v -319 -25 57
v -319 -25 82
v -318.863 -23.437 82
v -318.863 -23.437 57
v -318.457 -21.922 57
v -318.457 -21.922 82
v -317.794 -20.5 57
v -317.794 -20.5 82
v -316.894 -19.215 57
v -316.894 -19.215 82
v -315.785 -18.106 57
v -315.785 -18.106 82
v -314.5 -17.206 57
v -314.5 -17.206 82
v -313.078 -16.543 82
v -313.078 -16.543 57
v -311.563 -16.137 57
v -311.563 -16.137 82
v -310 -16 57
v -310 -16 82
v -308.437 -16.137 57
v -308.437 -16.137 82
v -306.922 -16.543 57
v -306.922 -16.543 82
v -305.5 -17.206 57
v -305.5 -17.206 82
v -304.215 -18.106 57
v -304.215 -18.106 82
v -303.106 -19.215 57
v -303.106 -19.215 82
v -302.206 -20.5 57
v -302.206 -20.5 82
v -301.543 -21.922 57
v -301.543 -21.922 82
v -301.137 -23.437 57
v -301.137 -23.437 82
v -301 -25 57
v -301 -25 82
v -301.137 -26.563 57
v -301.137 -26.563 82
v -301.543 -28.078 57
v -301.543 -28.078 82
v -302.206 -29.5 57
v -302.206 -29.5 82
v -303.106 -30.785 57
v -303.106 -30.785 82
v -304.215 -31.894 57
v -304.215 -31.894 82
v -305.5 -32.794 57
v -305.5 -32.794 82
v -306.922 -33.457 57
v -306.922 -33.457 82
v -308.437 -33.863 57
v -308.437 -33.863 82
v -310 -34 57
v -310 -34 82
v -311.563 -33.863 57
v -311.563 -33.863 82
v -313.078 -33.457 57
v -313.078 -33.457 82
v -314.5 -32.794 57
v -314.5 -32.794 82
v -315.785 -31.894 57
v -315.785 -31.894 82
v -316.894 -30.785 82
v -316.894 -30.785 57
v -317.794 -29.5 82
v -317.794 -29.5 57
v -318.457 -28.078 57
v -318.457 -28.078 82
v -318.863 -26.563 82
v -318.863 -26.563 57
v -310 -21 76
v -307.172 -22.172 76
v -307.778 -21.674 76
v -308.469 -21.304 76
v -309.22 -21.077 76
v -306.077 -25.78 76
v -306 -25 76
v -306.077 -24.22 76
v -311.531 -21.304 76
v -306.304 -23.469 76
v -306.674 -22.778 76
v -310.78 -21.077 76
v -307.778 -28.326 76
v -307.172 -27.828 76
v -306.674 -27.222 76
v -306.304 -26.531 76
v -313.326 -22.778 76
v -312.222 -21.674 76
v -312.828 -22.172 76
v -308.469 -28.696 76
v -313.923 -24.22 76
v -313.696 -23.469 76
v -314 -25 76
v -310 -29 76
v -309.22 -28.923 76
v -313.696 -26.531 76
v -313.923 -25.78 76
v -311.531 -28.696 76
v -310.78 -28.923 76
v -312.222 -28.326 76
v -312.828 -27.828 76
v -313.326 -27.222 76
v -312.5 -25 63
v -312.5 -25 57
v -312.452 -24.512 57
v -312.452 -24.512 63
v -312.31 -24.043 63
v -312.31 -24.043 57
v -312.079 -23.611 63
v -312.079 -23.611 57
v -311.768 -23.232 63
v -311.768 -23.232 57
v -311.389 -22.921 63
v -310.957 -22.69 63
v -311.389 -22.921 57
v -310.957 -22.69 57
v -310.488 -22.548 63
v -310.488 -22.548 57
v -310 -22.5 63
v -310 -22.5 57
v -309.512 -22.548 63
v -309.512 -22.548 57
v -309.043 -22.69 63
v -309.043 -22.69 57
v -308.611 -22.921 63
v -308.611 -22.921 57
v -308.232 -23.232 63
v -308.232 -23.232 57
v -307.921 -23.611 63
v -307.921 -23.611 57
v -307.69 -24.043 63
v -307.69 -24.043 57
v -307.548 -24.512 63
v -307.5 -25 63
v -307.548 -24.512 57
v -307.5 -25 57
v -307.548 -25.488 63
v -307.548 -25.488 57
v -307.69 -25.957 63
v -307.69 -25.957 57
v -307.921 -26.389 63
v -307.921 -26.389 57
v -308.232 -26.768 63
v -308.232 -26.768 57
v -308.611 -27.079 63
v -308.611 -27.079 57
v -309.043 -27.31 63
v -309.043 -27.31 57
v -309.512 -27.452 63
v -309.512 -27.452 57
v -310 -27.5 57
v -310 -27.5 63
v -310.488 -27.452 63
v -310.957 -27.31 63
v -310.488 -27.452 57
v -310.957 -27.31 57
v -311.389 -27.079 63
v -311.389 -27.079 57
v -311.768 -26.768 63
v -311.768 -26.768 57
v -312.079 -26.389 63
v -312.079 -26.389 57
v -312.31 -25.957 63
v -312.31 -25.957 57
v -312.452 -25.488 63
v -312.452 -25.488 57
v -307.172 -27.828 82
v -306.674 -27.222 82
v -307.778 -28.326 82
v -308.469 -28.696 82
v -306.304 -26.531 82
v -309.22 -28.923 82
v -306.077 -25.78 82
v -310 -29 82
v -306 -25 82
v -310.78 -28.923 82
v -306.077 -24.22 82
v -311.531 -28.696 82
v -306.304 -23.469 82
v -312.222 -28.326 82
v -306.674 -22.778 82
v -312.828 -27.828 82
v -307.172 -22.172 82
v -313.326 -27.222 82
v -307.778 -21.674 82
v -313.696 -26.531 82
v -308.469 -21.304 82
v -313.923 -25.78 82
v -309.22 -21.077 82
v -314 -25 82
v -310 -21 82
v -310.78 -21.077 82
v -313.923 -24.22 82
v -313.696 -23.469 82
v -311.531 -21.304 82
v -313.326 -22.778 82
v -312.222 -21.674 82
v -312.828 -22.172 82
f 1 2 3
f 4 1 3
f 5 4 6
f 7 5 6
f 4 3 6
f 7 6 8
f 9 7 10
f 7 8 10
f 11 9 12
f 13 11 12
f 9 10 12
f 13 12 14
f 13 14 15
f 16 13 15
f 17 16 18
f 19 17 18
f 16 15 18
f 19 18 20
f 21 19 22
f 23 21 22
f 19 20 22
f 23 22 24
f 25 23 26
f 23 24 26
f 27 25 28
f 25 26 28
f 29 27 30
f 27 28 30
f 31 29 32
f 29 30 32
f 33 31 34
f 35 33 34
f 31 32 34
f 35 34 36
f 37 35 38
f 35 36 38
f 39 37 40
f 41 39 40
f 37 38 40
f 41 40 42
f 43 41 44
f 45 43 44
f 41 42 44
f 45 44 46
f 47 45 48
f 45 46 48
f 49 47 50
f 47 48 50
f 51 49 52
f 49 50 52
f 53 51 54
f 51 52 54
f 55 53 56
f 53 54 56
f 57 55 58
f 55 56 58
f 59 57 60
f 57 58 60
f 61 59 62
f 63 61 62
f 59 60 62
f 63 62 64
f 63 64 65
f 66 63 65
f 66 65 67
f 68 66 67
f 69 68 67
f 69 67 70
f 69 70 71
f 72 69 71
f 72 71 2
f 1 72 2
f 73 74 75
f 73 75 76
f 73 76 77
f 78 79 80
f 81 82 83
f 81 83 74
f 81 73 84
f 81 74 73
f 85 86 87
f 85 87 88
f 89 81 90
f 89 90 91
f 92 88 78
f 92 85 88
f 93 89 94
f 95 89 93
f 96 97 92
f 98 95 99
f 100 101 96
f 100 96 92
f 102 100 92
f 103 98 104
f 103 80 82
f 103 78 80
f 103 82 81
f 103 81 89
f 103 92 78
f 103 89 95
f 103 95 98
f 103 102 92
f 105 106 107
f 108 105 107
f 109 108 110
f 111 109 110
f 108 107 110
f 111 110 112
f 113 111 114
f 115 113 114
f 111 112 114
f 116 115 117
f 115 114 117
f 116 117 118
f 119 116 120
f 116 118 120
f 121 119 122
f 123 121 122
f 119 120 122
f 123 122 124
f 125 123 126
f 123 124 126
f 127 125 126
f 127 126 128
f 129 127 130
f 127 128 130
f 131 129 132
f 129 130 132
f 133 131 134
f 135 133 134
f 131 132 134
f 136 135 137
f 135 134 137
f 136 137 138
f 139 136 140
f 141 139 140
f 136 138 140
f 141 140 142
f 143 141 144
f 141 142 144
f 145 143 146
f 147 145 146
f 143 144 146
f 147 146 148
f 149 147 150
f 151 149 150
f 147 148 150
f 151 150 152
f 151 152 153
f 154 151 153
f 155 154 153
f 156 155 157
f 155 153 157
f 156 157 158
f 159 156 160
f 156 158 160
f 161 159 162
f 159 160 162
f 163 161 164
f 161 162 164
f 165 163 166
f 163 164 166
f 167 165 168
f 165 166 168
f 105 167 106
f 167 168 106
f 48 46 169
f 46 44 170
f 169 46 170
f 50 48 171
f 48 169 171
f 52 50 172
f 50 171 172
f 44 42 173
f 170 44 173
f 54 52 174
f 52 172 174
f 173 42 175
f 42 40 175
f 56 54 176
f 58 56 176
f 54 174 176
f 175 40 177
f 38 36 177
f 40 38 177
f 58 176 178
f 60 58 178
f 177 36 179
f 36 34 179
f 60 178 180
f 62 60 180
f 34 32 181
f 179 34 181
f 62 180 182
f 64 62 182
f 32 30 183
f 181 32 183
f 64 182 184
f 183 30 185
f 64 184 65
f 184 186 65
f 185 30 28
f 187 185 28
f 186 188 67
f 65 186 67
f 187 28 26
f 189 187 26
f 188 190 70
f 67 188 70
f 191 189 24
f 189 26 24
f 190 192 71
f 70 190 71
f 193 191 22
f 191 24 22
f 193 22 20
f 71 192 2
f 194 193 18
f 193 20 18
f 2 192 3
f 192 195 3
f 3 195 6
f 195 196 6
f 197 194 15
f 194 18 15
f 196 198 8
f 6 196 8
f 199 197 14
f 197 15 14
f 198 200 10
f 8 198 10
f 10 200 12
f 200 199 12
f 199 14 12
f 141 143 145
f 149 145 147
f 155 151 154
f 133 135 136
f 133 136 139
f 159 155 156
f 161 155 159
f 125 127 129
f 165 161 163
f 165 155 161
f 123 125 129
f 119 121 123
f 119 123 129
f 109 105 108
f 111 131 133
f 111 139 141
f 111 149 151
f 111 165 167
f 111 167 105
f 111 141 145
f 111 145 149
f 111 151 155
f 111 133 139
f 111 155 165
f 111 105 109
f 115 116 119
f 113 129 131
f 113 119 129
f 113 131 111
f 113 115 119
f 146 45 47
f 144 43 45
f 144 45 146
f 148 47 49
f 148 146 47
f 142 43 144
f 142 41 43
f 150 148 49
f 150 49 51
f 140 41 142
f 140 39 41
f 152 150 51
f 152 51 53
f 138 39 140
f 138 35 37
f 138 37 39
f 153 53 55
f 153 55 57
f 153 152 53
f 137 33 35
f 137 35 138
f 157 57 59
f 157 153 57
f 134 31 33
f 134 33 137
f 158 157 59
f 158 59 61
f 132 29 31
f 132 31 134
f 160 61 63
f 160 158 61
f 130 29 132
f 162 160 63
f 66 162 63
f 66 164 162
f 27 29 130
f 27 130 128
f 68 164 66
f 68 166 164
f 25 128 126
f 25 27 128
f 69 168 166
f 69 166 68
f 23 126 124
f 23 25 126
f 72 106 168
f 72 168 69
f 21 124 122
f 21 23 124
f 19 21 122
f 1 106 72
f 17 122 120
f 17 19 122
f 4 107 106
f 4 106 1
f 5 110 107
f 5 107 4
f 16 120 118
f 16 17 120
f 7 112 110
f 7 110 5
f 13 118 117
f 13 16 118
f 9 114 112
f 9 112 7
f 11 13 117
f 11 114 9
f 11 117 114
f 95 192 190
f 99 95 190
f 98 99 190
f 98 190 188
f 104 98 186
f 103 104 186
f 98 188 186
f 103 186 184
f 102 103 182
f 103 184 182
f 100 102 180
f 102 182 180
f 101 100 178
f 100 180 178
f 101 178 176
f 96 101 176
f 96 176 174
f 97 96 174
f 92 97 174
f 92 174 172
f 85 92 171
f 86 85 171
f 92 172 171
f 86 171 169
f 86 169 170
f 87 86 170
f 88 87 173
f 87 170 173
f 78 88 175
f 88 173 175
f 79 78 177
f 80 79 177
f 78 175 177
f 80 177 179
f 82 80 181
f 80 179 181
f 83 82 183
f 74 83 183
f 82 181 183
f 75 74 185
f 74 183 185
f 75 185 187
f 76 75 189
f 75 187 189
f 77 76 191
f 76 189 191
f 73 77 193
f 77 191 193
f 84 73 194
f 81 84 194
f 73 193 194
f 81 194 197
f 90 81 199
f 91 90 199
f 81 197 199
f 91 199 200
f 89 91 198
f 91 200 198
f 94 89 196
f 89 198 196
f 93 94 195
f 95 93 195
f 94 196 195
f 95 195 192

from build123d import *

# Parameters (mm, degrees)
SKETCH045_R              = 9
PAD027_DEPTH             = 25
SKETCH046_R              = 2.5
POCKET021_DEPTH          = 6
SKETCH047_R              = 4
POCKET022_DEPTH          = 6
CLONE040_PLACEMENT_ANGLE = 180


with BuildPart() as part:
    # Sketch045 → Pad027 (new body)
    with BuildSketch(Plane.XY):
        Circle(SKETCH045_R)
    extrude(amount=PAD027_DEPTH)

    # Sketch046 (on Face3 of Pad027) → Pocket021 (cut)
    with BuildSketch(Plane.XY.offset(25)):
        Circle(SKETCH046_R)
    extrude(amount=-POCKET021_DEPTH, mode=Mode.SUBTRACT)

    # Sketch047 (on Face2 of Pocket021) → Pocket022 (cut)
    with BuildSketch(Plane(origin=(0, 0, 0), x_dir=(1, 0, 0), z_dir=(0, 0, -1))):
        Circle(SKETCH047_R)
    extrude(amount=-POCKET022_DEPTH, mode=Mode.SUBTRACT)


with BuildPart() as part_1:
    # Clone040 placement: moved
    add(part.part.moved(Location((-310, -25, 82))).rotate(Axis((-310, -25, 82), (0, 1, 0)), CLONE040_PLACEMENT_ANGLE))


solid = part_1.part
